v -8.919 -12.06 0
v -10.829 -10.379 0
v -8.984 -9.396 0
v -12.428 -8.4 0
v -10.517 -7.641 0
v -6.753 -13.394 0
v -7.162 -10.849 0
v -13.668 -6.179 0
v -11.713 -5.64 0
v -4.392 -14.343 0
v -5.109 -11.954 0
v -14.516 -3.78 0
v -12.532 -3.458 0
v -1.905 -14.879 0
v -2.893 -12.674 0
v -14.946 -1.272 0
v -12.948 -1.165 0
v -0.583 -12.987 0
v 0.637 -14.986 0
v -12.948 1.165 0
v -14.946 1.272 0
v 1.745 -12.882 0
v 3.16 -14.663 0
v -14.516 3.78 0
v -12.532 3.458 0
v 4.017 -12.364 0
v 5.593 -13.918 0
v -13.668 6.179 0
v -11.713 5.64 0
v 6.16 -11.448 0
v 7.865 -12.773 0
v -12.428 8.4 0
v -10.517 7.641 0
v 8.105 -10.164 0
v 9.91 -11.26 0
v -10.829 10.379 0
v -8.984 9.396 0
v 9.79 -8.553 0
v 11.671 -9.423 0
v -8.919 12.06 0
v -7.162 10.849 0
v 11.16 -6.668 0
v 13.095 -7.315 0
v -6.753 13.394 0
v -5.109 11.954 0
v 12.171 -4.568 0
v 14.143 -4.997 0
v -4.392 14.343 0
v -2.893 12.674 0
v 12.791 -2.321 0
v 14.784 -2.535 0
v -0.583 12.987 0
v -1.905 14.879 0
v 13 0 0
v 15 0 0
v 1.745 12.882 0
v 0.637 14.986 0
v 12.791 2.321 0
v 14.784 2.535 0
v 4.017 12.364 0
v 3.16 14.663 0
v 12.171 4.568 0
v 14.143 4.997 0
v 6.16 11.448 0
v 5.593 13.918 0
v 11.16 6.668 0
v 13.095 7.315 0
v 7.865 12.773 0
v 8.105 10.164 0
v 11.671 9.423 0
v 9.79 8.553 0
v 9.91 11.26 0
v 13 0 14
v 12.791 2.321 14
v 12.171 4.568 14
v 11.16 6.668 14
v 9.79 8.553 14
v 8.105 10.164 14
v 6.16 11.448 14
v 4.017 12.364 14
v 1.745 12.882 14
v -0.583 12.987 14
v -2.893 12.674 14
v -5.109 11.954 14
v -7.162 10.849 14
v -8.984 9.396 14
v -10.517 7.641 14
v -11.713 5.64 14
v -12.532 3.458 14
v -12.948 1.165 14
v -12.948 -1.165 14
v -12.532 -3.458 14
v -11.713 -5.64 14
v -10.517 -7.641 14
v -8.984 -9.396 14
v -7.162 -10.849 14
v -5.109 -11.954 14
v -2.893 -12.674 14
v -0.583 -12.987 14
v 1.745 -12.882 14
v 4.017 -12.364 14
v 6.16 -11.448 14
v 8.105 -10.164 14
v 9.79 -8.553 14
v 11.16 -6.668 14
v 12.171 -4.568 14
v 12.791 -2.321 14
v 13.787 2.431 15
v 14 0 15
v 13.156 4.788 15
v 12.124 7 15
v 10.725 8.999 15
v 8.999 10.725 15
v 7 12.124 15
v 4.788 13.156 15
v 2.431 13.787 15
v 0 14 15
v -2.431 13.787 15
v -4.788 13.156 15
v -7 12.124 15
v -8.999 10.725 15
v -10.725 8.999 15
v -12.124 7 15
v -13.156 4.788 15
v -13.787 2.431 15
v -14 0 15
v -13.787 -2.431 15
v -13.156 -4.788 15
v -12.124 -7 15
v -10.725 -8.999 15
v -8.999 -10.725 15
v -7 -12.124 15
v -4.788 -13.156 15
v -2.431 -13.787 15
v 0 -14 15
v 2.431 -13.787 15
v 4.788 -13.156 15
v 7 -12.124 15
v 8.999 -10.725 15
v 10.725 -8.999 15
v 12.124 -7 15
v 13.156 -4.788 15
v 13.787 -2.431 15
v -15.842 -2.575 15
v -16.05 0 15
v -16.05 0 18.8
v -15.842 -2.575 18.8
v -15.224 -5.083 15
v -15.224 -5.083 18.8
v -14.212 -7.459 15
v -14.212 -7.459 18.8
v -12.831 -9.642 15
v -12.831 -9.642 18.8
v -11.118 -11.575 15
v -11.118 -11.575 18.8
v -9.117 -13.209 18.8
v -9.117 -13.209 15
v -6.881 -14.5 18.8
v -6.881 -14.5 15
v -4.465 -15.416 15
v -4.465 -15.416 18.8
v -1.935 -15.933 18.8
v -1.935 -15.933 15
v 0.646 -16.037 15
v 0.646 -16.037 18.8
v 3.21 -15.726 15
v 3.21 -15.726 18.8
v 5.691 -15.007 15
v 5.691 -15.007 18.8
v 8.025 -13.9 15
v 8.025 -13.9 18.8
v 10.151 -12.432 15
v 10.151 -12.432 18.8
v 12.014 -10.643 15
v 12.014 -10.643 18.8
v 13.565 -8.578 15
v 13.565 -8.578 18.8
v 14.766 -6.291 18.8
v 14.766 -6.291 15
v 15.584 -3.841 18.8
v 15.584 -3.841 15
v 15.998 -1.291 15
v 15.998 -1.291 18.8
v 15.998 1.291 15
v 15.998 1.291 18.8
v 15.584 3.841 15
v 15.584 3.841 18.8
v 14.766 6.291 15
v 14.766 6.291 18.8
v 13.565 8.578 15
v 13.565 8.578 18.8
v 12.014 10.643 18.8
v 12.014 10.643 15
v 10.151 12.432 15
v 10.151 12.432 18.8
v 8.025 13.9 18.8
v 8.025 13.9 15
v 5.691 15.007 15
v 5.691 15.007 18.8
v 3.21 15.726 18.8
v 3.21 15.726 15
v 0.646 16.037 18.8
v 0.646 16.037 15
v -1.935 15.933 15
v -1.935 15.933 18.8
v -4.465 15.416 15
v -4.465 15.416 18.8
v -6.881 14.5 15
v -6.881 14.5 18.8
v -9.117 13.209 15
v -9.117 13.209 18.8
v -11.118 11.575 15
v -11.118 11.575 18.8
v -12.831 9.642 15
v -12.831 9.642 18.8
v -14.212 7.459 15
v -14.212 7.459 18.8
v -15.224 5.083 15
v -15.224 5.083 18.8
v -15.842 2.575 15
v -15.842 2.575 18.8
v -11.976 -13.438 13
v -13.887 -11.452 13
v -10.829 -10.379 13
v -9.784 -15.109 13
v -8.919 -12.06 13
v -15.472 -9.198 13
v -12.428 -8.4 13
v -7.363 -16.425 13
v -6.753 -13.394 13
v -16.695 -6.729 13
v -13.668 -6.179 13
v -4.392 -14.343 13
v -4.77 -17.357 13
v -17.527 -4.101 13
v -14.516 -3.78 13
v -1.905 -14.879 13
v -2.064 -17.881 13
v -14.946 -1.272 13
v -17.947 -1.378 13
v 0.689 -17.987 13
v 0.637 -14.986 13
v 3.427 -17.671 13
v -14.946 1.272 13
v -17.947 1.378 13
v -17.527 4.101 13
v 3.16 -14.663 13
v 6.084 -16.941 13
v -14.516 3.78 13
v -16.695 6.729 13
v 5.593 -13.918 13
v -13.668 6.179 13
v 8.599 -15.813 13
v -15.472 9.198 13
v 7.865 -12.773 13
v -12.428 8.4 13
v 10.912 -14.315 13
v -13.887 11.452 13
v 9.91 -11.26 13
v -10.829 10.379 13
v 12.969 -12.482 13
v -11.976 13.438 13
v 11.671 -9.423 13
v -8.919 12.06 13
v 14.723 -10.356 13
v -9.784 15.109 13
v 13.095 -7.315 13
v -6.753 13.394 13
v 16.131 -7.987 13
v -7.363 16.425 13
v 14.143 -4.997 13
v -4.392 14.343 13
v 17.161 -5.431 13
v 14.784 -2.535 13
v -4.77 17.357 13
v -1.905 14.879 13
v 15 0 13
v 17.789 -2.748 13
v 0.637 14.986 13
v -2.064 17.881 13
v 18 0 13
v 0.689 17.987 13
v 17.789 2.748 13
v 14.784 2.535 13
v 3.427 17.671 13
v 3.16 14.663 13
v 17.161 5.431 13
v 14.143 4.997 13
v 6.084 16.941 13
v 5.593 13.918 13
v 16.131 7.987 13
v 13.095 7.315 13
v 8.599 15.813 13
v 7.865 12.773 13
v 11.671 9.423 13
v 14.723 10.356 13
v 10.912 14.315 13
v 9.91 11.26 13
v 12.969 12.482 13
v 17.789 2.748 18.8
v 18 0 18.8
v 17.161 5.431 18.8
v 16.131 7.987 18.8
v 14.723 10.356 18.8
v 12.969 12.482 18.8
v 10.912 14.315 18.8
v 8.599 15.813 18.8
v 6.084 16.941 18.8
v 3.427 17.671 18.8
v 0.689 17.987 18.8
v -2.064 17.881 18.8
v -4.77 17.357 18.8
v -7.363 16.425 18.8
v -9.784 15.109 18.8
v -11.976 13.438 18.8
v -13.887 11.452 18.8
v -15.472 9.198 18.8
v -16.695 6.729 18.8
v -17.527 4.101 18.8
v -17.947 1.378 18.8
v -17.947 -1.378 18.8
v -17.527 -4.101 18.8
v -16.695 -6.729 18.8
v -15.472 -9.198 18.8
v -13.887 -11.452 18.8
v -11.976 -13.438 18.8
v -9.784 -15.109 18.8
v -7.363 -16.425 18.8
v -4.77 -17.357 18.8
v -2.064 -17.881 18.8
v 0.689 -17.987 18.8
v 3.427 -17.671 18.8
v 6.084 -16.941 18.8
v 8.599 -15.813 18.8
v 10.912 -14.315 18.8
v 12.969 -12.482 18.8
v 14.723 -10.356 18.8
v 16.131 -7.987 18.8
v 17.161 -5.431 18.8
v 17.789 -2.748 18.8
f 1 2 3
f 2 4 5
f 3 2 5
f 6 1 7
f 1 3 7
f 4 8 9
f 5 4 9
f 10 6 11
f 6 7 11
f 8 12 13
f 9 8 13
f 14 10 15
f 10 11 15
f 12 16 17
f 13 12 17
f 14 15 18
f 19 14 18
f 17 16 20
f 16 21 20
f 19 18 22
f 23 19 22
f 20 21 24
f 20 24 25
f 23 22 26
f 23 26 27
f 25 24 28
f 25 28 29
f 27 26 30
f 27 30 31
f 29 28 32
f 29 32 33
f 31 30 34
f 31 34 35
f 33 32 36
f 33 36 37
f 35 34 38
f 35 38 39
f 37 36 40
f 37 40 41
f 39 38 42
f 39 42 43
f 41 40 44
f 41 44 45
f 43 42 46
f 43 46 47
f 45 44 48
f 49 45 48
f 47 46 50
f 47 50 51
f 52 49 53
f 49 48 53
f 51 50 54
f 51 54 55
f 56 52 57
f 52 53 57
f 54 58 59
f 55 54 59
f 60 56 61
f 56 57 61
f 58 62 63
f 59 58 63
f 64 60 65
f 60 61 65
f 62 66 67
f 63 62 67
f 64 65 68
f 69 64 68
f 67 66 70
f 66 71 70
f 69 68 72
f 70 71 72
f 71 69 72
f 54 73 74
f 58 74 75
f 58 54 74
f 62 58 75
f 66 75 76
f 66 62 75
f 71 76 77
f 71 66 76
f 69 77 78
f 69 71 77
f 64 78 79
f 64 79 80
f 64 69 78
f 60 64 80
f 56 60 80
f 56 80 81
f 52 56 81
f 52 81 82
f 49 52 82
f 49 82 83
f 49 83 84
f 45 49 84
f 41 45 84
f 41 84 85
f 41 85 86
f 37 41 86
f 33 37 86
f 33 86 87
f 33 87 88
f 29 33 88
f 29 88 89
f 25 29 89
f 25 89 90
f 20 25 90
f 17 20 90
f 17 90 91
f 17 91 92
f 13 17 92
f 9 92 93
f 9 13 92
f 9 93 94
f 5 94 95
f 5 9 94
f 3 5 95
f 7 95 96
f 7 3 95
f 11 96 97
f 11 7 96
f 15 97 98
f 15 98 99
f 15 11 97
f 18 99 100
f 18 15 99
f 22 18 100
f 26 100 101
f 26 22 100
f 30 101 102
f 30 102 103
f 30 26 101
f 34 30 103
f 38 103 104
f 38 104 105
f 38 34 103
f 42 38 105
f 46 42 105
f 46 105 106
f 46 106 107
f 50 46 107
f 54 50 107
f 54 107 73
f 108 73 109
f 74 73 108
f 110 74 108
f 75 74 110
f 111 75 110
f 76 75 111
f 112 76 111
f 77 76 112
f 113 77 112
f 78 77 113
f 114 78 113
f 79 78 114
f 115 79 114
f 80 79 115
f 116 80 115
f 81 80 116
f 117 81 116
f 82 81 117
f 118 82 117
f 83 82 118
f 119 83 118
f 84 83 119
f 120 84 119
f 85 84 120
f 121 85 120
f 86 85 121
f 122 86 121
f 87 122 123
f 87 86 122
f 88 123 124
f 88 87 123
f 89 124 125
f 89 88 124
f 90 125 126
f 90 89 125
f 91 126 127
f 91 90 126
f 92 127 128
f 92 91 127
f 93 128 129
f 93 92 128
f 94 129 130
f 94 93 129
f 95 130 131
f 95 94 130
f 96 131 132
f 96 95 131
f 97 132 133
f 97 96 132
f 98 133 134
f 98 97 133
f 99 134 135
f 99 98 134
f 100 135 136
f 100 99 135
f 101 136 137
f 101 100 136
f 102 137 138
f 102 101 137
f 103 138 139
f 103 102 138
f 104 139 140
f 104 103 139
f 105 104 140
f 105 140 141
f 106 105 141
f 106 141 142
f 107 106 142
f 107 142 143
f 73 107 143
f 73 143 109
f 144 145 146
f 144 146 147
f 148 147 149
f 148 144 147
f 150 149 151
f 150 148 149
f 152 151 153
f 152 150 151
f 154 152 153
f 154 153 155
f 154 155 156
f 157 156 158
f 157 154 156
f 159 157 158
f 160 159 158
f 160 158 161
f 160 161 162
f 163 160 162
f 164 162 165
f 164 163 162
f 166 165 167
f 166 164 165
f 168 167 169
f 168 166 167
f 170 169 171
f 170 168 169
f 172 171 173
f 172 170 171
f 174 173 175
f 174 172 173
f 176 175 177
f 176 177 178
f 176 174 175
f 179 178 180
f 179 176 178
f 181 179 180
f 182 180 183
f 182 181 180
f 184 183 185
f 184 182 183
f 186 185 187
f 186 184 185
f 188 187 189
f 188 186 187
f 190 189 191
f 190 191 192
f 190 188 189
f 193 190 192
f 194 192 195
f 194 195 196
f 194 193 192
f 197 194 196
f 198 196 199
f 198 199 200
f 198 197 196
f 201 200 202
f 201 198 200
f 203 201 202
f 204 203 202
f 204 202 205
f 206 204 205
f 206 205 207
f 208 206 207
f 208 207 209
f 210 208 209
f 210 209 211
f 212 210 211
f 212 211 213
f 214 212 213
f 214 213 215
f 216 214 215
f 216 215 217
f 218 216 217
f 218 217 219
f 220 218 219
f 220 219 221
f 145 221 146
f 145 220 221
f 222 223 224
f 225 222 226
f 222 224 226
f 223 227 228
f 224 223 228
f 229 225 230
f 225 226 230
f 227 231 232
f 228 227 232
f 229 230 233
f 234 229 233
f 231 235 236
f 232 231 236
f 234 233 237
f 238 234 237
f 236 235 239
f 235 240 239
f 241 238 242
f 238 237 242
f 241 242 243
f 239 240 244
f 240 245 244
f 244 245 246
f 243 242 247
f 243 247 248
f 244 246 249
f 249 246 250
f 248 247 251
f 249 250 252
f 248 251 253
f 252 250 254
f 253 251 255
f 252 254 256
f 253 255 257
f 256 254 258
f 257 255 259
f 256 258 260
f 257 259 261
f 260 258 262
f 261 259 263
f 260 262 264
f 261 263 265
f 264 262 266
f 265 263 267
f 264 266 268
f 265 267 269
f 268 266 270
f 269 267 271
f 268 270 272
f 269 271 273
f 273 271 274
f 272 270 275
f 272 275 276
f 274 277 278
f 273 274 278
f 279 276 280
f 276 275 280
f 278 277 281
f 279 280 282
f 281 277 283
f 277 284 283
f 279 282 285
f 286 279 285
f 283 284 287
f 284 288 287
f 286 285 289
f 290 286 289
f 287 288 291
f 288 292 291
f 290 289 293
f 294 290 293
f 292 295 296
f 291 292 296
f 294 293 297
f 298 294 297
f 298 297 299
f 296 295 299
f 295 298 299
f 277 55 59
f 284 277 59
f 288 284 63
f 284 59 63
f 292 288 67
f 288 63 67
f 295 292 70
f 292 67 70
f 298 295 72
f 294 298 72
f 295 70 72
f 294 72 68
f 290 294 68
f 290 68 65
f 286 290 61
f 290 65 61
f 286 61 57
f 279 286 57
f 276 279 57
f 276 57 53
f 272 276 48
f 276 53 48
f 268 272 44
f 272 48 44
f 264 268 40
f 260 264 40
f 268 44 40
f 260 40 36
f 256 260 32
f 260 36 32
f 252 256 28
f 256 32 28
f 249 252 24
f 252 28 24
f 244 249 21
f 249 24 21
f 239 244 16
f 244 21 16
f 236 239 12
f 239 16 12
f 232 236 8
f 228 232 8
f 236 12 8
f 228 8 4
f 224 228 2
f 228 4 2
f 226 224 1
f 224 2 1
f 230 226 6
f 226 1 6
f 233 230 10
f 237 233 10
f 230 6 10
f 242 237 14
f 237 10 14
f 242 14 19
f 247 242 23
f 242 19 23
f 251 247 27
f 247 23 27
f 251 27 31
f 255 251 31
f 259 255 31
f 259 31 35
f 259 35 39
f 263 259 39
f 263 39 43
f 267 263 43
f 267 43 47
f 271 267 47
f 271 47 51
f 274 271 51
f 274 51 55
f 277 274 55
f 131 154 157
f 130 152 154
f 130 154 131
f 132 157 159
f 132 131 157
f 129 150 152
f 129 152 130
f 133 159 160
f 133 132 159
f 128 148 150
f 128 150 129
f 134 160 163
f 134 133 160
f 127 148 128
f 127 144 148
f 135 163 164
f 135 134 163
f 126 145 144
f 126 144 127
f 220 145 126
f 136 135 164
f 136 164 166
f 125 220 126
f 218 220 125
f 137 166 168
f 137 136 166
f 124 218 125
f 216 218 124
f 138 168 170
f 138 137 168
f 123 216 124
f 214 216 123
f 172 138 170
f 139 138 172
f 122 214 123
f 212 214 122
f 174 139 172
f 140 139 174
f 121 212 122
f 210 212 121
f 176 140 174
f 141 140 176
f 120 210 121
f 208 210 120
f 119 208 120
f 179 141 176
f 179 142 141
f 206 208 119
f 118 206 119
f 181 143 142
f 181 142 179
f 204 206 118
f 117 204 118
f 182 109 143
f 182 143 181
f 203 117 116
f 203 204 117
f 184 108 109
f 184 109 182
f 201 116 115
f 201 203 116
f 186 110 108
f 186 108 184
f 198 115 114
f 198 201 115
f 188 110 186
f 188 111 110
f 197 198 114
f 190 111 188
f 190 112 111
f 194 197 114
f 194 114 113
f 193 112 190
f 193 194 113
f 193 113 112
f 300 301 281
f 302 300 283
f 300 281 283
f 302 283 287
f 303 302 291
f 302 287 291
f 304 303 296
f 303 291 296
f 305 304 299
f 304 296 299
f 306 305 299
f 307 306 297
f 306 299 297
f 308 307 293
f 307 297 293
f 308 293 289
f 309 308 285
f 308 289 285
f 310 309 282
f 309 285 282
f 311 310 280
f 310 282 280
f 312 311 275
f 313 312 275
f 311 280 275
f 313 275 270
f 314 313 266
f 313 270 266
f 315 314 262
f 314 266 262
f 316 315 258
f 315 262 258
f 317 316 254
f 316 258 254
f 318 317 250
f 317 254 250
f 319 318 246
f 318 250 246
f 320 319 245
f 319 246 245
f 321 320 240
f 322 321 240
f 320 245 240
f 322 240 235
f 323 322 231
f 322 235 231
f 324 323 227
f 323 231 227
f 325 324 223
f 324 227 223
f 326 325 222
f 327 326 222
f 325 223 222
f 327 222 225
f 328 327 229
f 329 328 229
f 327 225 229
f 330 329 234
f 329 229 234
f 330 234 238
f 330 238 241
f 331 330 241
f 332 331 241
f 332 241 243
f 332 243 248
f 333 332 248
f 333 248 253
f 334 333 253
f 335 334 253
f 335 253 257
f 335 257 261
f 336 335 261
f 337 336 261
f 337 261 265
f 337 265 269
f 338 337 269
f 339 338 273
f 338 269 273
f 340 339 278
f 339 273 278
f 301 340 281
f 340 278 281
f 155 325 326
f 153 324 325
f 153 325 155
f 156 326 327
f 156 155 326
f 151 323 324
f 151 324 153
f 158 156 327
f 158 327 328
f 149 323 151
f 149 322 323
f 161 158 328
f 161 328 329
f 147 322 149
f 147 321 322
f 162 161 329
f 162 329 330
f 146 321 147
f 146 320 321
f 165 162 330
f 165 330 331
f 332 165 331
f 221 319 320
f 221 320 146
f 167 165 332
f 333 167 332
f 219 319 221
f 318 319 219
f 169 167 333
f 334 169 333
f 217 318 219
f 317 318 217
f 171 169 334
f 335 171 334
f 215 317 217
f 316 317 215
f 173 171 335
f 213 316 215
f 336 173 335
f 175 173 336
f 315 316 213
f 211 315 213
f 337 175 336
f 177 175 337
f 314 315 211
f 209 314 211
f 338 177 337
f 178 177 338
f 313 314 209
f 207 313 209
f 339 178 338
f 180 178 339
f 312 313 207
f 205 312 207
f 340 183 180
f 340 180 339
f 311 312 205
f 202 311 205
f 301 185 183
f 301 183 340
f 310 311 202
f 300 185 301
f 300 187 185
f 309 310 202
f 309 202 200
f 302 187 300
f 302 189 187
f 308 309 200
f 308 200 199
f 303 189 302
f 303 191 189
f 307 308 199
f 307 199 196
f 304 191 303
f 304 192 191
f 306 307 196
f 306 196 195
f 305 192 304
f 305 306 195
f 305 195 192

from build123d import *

# Parameters (mm, degrees)
SKETCH1_R           = 15
SKETCH1_R_2         = 13
BOSS_EXTRUDE1_DEPTH = 13
SKETCH2_R           = 18
SKETCH2_R_2         = 13
BOSS_EXTRUDE2_DEPTH = 2
CHAMFER1_SIZE       = 1
SKETCH4_R           = 18
SKETCH4_R_2         = 16.05
BOSS_EXTRUDE3_DEPTH = 3.8


with BuildPart() as part:
    # Sketch1 → Boss-Extrude1 (new body)
    with BuildSketch(Plane.XY):
        Circle(SKETCH1_R)
        Circle(SKETCH1_R_2, mode=Mode.SUBTRACT)
    extrude(amount=BOSS_EXTRUDE1_DEPTH)

    # Sketch2 → Boss-Extrude2 (add)
    with BuildSketch(Plane.XY.offset(13)):
        Circle(SKETCH2_R)
        Circle(SKETCH2_R_2, mode=Mode.SUBTRACT)
    extrude(amount=BOSS_EXTRUDE2_DEPTH)

    # Chamfer1
    chamfer1_edges = [part.edges().sort_by_distance(p)[0] for p in [
        (-13, 0, 15),
    ]]
    chamfer(chamfer1_edges, length=CHAMFER1_SIZE)

    # Sketch4 → Boss-Extrude3 (add)
    with BuildSketch(Plane.XY.offset(15)):
        Circle(SKETCH4_R)
        with Locations(Location((0, 0, 0), (0, 0, 180))):
            Circle(SKETCH4_R_2, mode=Mode.SUBTRACT)
    extrude(amount=BOSS_EXTRUDE3_DEPTH)


solid = part.part
